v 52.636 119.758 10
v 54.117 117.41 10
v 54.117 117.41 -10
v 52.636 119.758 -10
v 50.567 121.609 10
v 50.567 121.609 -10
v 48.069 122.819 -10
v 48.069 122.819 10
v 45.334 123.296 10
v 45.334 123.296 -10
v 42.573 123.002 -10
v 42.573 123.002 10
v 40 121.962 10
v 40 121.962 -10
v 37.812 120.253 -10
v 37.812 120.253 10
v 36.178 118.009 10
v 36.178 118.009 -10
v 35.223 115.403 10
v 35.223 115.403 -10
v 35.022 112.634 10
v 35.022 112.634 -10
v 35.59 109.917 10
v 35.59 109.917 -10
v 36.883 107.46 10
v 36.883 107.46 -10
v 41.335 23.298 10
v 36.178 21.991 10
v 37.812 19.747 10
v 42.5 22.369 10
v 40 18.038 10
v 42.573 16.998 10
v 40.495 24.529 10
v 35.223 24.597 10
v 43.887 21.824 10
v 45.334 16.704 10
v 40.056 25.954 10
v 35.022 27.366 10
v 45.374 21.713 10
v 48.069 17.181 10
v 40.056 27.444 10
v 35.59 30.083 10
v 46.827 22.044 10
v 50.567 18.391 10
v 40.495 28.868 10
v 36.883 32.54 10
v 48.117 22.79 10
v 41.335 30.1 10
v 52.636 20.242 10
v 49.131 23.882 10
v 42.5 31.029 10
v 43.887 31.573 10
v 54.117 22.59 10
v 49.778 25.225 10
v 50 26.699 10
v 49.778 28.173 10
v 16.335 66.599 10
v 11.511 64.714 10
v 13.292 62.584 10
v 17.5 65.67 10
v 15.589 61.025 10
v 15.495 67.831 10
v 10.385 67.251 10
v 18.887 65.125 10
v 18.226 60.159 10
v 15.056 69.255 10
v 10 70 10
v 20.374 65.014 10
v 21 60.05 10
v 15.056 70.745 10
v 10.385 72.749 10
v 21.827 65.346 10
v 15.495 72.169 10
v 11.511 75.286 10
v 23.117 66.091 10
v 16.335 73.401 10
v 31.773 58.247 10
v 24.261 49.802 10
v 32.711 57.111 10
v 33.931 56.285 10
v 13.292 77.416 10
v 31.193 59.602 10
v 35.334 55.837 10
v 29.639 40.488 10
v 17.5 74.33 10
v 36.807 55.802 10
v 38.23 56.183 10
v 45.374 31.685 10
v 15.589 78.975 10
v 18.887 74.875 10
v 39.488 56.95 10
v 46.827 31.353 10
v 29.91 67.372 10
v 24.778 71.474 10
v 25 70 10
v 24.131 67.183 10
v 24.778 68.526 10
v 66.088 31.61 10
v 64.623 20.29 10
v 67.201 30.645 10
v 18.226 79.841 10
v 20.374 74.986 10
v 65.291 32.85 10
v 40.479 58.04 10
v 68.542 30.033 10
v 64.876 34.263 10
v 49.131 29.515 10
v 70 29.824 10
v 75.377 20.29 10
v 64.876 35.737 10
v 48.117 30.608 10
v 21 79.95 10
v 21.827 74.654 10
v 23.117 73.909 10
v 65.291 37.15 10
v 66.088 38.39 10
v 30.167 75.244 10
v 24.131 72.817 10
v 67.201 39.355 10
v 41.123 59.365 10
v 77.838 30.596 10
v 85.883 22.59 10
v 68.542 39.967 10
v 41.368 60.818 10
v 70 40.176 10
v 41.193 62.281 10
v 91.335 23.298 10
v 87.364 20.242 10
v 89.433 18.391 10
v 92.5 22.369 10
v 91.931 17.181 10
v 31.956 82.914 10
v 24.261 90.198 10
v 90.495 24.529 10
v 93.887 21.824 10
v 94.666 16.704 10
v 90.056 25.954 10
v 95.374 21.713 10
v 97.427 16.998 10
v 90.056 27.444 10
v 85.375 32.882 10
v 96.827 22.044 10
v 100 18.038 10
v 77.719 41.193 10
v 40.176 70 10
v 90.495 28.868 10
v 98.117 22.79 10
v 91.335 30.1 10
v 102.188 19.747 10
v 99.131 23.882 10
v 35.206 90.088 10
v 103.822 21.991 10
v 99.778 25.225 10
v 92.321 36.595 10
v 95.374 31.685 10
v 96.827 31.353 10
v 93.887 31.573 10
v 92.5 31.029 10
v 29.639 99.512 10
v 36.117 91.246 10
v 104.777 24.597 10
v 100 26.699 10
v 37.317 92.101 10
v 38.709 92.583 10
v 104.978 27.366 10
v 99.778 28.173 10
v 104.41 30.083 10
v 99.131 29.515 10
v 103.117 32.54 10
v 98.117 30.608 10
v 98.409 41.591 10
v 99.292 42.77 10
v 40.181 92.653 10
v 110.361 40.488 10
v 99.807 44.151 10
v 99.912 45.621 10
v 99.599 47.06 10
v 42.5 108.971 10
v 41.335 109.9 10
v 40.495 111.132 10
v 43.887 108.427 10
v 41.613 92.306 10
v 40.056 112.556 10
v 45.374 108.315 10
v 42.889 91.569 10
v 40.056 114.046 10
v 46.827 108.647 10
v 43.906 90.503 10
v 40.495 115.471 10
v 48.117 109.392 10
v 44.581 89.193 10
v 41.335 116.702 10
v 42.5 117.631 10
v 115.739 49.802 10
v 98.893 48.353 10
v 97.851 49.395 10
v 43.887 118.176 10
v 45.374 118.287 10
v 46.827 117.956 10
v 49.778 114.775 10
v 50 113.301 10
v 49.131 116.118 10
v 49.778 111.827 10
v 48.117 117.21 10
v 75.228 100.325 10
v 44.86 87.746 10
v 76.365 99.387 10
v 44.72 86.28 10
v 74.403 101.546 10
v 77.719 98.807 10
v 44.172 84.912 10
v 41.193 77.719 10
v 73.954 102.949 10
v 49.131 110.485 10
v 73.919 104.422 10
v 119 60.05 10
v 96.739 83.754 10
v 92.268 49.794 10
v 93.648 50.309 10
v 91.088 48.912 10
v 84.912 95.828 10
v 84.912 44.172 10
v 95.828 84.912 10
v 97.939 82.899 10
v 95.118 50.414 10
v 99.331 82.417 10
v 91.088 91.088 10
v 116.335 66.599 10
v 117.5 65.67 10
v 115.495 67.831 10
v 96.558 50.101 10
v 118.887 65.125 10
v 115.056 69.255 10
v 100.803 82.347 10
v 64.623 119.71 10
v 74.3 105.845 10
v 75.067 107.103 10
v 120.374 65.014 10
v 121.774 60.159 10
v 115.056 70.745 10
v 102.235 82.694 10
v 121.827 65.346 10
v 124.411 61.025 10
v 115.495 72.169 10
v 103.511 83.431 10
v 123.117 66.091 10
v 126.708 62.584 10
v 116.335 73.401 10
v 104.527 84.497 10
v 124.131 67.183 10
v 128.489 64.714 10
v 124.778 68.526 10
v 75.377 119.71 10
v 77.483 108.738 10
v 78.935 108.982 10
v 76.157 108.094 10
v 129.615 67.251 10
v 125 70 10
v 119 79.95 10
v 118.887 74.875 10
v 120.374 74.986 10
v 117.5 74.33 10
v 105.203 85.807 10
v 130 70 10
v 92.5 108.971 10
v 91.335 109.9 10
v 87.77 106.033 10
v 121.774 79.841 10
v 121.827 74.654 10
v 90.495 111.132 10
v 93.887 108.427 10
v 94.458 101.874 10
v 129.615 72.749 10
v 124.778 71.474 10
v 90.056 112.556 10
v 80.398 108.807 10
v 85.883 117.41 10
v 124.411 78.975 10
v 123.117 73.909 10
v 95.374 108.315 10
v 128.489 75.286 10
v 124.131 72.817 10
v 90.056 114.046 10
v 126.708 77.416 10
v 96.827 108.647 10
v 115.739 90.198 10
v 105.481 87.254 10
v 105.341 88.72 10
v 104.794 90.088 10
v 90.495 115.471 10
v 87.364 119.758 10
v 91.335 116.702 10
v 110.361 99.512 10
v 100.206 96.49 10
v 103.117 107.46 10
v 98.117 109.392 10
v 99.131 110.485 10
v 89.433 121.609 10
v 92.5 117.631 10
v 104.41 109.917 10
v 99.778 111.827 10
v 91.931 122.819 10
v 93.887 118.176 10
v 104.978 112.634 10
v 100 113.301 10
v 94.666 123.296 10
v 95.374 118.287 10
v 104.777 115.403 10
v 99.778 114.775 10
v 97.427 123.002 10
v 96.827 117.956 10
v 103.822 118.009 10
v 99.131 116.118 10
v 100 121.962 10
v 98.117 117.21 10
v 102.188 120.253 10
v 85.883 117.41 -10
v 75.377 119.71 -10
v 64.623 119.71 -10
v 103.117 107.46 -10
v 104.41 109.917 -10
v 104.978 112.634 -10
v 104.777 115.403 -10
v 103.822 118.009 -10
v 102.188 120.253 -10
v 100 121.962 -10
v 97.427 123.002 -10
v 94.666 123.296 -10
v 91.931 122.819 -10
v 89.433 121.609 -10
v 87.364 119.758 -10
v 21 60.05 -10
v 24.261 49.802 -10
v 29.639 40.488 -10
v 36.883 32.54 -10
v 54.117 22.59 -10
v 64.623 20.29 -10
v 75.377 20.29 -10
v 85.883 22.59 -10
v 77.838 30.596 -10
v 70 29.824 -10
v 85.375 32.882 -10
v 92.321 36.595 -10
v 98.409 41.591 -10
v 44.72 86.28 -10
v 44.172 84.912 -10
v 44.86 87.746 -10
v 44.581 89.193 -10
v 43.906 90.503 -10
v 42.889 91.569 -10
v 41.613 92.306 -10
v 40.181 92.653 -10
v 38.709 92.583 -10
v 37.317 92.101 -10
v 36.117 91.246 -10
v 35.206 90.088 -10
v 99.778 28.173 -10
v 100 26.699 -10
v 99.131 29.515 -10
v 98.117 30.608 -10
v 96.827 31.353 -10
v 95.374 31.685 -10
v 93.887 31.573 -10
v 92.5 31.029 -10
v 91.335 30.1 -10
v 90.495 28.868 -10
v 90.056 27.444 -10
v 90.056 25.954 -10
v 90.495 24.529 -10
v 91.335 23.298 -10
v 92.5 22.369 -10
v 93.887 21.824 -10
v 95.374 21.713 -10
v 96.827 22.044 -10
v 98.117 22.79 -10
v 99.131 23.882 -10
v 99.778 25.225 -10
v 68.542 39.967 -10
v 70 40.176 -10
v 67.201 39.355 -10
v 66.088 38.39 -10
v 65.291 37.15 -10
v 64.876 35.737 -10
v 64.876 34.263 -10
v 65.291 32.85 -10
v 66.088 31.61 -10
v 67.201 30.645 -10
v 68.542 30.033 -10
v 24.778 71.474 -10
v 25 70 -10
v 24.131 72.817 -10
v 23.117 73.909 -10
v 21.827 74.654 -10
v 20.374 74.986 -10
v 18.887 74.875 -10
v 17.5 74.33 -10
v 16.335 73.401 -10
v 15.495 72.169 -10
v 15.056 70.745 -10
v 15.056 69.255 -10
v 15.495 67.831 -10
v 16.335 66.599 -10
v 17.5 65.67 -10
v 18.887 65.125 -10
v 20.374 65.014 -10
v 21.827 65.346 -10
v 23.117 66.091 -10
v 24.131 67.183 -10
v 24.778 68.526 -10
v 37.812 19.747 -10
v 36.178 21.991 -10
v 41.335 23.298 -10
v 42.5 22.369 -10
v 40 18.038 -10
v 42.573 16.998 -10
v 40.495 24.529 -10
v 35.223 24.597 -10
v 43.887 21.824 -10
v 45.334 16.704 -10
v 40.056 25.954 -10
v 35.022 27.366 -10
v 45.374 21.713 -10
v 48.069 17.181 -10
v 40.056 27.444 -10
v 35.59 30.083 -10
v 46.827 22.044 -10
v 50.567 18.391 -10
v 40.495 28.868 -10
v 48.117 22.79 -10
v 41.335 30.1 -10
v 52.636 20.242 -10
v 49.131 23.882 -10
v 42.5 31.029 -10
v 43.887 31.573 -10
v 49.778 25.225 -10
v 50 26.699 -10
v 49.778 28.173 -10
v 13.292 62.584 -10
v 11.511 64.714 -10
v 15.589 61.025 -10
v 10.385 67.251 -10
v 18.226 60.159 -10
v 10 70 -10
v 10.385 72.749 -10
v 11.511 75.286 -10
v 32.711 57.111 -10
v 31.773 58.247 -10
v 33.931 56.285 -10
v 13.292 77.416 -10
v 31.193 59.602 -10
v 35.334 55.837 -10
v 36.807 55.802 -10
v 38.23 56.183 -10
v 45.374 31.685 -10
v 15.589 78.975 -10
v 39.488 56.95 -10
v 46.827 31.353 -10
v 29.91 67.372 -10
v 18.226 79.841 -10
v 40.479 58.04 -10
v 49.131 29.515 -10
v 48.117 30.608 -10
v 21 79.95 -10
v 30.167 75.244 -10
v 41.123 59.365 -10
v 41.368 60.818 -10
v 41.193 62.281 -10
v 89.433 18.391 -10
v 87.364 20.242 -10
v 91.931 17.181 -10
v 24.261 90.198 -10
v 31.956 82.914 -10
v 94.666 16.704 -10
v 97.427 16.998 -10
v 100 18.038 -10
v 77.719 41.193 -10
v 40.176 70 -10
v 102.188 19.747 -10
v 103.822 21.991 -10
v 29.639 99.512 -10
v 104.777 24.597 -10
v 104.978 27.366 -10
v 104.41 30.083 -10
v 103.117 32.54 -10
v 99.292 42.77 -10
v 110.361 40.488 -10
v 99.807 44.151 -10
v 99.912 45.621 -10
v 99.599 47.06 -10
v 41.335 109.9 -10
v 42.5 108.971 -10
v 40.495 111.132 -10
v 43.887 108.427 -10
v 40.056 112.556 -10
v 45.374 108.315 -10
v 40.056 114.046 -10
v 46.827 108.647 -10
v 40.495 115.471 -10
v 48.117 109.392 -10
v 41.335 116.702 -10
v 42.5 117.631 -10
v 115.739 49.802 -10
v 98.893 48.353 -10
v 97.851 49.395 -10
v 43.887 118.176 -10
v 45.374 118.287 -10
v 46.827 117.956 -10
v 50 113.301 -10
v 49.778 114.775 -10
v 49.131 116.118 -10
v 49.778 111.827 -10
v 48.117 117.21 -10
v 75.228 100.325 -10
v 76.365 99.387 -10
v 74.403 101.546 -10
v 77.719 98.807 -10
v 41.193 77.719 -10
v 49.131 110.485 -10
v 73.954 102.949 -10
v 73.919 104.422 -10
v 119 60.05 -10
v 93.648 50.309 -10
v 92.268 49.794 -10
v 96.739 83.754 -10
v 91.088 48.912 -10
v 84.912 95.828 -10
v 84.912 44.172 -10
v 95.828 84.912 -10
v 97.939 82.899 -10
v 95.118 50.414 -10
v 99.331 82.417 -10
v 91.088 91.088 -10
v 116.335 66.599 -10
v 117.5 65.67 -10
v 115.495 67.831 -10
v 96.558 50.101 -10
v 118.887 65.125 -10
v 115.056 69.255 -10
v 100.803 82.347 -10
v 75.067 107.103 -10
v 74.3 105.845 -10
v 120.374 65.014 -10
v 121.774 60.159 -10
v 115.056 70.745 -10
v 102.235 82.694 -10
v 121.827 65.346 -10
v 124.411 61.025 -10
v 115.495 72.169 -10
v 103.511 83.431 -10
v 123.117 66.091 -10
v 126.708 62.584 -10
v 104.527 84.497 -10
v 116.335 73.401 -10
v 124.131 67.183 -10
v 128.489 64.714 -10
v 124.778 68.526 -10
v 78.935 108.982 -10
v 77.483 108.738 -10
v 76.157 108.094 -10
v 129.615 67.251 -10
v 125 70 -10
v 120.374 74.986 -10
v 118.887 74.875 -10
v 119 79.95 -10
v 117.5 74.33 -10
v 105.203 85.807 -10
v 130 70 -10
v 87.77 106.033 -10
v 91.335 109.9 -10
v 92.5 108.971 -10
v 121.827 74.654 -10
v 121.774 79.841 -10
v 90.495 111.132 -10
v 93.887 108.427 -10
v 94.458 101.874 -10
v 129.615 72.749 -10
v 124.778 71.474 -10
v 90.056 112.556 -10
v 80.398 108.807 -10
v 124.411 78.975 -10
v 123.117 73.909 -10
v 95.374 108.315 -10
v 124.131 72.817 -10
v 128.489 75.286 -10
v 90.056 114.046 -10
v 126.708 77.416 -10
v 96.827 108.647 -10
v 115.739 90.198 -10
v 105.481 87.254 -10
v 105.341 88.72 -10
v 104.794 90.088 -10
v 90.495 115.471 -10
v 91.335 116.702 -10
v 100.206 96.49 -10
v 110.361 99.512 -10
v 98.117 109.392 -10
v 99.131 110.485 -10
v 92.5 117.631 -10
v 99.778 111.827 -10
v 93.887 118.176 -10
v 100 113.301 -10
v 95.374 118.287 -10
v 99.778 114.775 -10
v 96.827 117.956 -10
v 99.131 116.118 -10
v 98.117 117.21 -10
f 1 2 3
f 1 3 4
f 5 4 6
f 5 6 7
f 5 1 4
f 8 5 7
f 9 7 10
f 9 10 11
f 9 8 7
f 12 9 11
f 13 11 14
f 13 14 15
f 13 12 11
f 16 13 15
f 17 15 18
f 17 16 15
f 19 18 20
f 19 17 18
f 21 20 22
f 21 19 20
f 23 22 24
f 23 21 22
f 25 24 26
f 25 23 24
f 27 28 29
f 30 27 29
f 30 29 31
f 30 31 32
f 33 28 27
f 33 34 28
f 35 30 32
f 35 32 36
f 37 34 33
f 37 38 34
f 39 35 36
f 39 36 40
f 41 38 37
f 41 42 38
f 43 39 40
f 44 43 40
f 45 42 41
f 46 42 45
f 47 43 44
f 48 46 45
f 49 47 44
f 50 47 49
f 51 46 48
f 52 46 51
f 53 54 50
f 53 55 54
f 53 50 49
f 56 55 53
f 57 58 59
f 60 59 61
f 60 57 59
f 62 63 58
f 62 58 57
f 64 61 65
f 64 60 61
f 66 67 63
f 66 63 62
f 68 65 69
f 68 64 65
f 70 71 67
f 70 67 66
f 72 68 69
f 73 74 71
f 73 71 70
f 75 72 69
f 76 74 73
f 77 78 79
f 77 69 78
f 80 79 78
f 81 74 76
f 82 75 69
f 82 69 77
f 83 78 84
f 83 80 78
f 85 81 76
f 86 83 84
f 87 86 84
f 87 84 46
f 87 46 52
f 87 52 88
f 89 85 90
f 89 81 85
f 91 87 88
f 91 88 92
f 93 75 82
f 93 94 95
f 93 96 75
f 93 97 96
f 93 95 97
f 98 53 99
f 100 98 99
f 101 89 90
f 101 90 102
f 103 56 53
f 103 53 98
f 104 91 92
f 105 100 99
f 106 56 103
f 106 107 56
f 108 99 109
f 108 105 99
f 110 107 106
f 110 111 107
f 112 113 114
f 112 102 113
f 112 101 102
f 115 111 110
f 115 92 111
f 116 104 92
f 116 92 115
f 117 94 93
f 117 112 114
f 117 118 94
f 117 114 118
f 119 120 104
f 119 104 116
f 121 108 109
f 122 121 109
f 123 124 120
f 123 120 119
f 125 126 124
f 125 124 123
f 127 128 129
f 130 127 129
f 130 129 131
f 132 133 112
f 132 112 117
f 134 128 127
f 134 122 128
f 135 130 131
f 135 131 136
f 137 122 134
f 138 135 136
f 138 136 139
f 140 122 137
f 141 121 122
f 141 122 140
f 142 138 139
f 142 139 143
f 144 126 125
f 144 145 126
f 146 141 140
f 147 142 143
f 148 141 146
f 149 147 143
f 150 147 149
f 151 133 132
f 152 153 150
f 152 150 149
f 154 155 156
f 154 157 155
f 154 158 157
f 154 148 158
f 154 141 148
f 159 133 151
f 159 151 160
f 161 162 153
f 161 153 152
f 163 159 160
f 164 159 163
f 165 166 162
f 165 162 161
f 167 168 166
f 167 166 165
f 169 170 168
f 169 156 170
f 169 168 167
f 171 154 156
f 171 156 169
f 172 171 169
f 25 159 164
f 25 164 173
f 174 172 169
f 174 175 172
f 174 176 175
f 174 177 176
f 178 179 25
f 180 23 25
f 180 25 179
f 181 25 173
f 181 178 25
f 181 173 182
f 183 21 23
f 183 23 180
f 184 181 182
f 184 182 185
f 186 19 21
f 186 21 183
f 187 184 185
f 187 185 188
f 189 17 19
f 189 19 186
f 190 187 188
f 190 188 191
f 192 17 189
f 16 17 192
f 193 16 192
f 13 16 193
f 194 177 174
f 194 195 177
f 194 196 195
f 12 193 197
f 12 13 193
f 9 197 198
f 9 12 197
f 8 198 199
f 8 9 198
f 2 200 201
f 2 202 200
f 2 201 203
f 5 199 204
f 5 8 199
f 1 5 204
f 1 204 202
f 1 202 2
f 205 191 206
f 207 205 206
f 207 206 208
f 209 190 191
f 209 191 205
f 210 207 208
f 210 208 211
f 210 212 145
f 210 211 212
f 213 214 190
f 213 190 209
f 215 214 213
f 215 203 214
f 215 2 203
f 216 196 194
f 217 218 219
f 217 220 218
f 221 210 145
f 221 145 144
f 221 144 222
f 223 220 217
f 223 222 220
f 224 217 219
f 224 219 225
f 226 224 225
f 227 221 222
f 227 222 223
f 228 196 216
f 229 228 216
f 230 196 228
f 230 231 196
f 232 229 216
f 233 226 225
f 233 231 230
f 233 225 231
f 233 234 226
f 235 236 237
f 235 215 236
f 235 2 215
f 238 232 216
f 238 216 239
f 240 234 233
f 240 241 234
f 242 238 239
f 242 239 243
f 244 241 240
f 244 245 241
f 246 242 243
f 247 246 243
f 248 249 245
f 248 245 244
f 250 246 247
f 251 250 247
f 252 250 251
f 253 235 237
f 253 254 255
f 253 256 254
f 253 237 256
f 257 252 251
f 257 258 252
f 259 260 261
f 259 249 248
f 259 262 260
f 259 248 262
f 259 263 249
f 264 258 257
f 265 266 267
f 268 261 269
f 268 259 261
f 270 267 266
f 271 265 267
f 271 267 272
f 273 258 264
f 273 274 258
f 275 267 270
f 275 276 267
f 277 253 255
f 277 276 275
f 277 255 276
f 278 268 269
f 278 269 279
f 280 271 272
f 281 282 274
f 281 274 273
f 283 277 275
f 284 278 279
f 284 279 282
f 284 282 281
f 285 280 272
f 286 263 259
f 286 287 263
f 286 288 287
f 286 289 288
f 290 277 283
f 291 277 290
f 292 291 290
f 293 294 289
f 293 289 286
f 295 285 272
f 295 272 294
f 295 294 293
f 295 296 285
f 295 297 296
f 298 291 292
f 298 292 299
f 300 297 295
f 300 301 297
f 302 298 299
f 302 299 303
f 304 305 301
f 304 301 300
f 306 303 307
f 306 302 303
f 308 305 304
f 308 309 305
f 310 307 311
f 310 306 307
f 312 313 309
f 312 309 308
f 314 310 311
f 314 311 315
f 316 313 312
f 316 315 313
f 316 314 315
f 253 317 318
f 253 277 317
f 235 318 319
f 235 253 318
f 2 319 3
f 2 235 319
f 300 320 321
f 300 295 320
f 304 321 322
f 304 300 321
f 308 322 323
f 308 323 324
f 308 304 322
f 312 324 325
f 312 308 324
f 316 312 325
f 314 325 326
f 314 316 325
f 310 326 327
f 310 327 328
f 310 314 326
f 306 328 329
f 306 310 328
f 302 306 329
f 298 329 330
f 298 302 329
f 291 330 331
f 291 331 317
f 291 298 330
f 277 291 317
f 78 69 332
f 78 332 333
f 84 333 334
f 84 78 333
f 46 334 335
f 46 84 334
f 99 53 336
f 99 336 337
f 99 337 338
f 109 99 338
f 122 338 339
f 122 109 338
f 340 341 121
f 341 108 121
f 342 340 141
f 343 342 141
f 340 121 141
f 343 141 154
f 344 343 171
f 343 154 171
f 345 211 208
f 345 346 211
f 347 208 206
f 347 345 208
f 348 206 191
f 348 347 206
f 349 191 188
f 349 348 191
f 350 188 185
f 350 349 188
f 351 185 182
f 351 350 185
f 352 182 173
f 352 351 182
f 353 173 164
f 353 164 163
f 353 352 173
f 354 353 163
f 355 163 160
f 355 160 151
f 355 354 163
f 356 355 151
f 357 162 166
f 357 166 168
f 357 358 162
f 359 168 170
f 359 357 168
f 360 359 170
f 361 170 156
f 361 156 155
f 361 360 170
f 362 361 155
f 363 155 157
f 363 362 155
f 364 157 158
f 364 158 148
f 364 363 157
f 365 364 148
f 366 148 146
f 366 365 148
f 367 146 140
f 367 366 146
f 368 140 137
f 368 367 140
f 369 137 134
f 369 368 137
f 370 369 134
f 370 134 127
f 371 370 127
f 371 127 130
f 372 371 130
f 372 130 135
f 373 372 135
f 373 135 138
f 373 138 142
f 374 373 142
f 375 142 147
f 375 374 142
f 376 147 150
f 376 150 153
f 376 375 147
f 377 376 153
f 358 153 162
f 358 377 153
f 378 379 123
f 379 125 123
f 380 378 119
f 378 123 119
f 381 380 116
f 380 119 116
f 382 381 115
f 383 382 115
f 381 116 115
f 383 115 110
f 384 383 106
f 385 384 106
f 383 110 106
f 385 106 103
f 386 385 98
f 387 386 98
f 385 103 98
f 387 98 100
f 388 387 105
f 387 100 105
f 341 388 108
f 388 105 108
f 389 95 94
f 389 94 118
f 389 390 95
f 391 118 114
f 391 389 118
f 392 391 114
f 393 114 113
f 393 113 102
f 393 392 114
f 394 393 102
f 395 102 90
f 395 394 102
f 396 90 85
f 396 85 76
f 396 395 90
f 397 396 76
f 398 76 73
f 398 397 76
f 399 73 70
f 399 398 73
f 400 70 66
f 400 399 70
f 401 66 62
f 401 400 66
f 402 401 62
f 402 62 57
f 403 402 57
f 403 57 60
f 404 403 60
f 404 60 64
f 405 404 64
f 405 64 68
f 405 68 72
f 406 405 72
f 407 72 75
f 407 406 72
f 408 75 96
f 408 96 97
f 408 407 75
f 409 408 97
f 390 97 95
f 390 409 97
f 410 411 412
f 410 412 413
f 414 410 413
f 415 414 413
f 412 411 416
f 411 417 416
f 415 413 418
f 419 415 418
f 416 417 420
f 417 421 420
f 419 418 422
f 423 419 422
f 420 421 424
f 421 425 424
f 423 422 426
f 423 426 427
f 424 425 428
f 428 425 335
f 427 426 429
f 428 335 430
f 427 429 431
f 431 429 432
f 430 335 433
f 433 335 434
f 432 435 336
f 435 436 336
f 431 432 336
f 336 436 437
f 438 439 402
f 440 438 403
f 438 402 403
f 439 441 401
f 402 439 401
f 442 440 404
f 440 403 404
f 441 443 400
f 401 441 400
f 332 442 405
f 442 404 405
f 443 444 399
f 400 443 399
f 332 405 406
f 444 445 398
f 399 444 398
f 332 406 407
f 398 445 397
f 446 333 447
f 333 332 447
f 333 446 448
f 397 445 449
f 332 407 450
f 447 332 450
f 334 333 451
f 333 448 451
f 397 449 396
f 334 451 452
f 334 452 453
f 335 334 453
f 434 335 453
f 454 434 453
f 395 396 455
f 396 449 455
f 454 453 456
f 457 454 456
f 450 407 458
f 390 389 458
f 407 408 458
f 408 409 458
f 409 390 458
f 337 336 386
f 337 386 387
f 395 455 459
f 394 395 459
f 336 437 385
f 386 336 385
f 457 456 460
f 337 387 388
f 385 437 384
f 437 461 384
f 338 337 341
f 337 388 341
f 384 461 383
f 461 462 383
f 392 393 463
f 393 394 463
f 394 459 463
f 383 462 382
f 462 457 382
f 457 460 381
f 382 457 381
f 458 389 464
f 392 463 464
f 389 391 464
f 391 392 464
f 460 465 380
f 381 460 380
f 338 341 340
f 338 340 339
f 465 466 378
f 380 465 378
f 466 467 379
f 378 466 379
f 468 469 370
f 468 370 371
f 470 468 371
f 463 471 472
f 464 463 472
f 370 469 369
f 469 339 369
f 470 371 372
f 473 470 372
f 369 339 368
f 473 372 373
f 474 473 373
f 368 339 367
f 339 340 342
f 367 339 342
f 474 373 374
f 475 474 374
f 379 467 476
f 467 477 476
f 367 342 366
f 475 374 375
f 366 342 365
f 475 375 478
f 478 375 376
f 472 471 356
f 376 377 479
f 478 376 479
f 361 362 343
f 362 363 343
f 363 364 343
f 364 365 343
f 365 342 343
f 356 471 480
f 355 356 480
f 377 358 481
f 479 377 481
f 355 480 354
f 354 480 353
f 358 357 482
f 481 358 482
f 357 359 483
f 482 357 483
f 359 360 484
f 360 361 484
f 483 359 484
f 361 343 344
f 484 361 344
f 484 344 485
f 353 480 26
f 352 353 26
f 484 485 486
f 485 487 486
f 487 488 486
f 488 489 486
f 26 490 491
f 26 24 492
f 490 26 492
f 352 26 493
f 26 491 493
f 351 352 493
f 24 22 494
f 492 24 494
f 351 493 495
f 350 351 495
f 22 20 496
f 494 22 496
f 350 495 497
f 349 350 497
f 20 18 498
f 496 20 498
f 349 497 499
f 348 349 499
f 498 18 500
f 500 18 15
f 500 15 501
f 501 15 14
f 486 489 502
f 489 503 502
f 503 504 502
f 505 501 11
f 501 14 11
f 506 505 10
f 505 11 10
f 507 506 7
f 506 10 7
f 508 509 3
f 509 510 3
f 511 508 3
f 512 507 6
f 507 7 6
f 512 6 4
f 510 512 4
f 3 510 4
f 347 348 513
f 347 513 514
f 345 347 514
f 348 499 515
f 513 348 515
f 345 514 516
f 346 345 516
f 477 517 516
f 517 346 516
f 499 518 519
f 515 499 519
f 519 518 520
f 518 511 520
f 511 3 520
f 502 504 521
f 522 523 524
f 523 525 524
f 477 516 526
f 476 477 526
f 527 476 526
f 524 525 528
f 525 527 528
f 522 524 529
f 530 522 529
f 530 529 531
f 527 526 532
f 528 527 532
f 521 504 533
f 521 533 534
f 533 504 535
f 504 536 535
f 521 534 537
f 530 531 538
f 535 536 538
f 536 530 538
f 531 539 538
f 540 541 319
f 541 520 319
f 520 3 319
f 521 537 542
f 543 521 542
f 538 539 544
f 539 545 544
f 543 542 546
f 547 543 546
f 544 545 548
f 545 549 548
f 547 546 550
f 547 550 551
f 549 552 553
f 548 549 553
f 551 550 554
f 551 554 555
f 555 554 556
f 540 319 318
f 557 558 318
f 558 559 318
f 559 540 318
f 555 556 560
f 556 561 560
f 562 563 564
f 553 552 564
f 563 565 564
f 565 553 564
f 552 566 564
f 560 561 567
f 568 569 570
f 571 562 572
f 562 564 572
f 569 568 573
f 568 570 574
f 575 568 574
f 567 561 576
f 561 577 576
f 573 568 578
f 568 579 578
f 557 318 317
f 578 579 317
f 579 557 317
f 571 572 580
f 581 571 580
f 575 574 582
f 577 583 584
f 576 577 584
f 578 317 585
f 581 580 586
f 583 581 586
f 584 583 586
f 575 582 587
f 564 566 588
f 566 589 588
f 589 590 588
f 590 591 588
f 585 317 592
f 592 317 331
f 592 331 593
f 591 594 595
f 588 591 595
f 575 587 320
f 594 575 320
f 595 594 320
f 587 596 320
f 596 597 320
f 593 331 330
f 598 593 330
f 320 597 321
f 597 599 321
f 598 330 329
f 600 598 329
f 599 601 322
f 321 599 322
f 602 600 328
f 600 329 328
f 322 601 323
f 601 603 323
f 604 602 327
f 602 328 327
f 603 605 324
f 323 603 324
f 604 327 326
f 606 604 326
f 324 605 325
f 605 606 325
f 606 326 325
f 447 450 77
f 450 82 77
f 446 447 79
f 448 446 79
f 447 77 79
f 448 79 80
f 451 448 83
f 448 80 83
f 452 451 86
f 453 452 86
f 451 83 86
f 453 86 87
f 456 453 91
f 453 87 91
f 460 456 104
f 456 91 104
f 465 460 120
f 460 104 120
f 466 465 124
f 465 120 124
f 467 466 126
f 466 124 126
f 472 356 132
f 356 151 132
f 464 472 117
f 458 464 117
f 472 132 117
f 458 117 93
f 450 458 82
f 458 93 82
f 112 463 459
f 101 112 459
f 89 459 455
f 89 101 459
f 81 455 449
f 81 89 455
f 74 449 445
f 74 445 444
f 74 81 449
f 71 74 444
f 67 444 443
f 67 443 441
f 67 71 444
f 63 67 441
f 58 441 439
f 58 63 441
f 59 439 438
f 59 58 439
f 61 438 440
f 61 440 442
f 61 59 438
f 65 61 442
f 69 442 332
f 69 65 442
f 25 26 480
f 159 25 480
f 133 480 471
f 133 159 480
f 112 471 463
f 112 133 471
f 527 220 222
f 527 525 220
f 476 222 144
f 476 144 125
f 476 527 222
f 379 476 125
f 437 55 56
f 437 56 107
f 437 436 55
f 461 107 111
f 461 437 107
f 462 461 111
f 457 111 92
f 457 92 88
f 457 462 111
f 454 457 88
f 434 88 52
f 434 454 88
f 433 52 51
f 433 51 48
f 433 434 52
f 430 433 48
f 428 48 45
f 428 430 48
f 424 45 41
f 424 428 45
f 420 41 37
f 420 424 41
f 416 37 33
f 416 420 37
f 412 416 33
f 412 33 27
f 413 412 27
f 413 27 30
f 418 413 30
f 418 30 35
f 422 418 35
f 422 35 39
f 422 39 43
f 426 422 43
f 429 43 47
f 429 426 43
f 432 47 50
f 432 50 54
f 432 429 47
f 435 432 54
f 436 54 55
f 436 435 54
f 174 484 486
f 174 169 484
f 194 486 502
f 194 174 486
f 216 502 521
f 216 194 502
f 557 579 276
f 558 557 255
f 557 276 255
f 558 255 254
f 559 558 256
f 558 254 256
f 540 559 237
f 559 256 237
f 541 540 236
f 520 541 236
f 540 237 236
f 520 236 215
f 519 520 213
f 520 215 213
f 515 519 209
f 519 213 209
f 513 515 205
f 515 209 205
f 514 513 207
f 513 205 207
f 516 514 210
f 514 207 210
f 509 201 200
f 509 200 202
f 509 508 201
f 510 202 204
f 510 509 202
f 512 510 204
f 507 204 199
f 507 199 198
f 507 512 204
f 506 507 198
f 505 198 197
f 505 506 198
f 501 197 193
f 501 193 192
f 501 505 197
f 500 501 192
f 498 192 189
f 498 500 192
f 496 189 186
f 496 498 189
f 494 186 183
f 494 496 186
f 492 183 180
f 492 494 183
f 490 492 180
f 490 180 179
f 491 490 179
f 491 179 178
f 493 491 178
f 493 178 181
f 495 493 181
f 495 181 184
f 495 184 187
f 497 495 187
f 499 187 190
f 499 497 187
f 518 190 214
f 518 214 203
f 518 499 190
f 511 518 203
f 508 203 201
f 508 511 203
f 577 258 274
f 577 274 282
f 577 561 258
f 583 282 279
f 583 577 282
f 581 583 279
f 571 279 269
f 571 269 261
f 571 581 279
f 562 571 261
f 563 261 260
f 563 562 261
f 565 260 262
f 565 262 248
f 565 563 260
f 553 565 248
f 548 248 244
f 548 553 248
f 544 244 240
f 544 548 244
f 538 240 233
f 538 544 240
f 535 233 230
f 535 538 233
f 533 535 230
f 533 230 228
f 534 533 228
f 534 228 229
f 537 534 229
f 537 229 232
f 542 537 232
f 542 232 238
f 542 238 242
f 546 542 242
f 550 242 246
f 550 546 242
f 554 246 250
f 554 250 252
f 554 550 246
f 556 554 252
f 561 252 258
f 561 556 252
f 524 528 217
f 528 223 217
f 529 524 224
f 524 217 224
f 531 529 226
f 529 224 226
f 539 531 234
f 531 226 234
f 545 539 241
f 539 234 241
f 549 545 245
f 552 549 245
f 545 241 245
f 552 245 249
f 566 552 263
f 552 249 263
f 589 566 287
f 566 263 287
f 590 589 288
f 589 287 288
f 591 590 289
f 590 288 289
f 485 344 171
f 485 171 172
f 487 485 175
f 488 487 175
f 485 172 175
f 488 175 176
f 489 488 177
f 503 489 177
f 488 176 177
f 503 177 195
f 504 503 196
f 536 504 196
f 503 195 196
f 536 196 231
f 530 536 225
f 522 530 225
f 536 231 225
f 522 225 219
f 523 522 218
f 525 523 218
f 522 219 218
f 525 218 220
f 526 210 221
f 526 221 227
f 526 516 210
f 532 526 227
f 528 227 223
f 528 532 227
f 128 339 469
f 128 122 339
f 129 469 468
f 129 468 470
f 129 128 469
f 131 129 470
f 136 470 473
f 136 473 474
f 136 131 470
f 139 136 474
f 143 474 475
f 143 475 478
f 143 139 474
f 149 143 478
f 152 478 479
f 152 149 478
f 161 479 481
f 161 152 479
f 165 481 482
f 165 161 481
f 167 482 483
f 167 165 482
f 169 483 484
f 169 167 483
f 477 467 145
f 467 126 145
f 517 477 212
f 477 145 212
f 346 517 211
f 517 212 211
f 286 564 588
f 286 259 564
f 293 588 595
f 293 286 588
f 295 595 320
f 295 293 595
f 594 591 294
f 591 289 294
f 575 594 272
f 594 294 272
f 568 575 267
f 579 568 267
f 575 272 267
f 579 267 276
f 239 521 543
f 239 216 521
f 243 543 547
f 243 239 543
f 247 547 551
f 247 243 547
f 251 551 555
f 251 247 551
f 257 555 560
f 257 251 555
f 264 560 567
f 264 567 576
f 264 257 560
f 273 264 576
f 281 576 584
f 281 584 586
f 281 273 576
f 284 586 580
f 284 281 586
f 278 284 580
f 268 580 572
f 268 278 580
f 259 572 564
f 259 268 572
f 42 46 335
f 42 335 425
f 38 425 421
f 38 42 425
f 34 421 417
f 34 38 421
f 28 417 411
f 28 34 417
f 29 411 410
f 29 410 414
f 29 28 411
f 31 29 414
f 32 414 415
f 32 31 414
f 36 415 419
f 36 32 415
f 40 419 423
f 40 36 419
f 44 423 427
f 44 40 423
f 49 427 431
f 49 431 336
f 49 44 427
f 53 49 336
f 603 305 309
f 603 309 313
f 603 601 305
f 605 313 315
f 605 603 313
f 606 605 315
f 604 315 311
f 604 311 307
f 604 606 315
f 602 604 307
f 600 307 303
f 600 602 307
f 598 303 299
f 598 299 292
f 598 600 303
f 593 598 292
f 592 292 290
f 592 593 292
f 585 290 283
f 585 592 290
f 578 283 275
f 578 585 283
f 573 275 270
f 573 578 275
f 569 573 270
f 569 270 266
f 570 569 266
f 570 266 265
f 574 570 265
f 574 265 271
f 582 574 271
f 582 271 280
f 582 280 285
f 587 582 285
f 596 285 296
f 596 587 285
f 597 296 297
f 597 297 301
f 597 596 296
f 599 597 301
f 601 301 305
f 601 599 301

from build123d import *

# Parameters (mm, degrees)
SKETCH2_R           = 5
BOSS_EXTRUDE1_DEPTH = 10


with BuildPart() as part:
    # Sketch2 → Boss-Extrude1 (new, symmetric)
    with BuildSketch(Plane.XY):
        with BuildLine():
            ThreePointArc((85.88315603, 117.410181971), (70, 120), (54.11684397, 117.410181971))
            ThreePointArc((54.11684397, 117.410181971), (40, 121.961524227), (36.88315603, 107.4603076))
            ThreePointArc((36.88315603, 107.4603076), (26.698729811, 95), (21, 79.949874371))
            ThreePointArc((21, 79.949874371), (10, 70), (21, 60.050125629))
            ThreePointArc((21, 60.050125629), (26.698729811, 45), (36.88315603, 32.5396924))
            ThreePointArc((36.88315603, 32.5396924), (40, 18.038475773), (54.11684397, 22.589818029))
            ThreePointArc((54.11684397, 22.589818029), (70, 20), (85.88315603, 22.589818029))
            ThreePointArc((85.88315603, 22.589818029), (100, 18.038475773), (103.11684397, 32.5396924))
            ThreePointArc((103.11684397, 32.5396924), (113.301270189, 45), (119, 60.050125629))
            ThreePointArc((119, 60.050125629), (130, 70), (119, 79.949874371))
            ThreePointArc((119, 79.949874371), (113.301270189, 95), (103.11684397, 107.4603076))
            ThreePointArc((103.11684397, 107.4603076), (100, 121.961524227), (85.88315603, 117.410181971))
        make_face()
        with Locations((120, 70)):
            Circle(SKETCH2_R, mode=Mode.SUBTRACT)
        with Locations((95, 26.698729811)):
            Circle(SKETCH2_R, mode=Mode.SUBTRACT)
        with Locations((45, 26.698729811)):
            Circle(SKETCH2_R, mode=Mode.SUBTRACT)
        with Locations((20, 70)):
            Circle(SKETCH2_R, mode=Mode.SUBTRACT)
        with Locations((45, 113.301270189)):
            Circle(SKETCH2_R, mode=Mode.SUBTRACT)
        with Locations((95, 113.301270189)):
            Circle(SKETCH2_R, mode=Mode.SUBTRACT)
        with BuildLine():
            ThreePointArc((104.793766493, 90.088190451), (94.45783105, 101.874065989), (80.398412541, 108.80740392))
            ThreePointArc((80.398412541, 108.80740392), (74.058666579, 105.147149882), (77.718920616, 98.80740392))
            ThreePointArc((77.718920616, 98.80740392), (88.15546898, 93.660667831), (95.828011772, 84.911809549))
            ThreePointArc((95.828011772, 84.911809549), (102.899079583, 83.017122639), (104.793766493, 90.088190451))
        make_face(mode=Mode.SUBTRACT)
        with BuildLine():
            ThreePointArc((70, 29.823619098), (85.374835344, 32.881863994), (98.408991379, 41.591008621))
            ThreePointArc((98.408991379, 41.591008621), (98.408991379, 48.911516696), (91.088483304, 48.911516696))
            ThreePointArc((91.088483304, 48.911516696), (81.413004922, 42.44656873), (70, 40.176380902))
            ThreePointArc((70, 40.176380902), (64.823619098, 35), (70, 29.823619098))
        make_face(mode=Mode.SUBTRACT)
        with BuildLine():
            ThreePointArc((35.206233507, 90.088190451), (30.167333606, 75.244070016), (31.19259608, 59.601587459))
            ThreePointArc((31.19259608, 59.601587459), (37.532342042, 55.941333421), (41.19259608, 62.281079384))
            ThreePointArc((41.19259608, 62.281079384), (40.431526098, 73.892763439), (44.171988228, 84.911809549))
            ThreePointArc((44.171988228, 84.911809549), (42.277301319, 91.982877361), (35.206233507, 90.088190451))
        make_face(mode=Mode.SUBTRACT)
    extrude(amount=BOSS_EXTRUDE1_DEPTH, both=True)


solid = part.part
